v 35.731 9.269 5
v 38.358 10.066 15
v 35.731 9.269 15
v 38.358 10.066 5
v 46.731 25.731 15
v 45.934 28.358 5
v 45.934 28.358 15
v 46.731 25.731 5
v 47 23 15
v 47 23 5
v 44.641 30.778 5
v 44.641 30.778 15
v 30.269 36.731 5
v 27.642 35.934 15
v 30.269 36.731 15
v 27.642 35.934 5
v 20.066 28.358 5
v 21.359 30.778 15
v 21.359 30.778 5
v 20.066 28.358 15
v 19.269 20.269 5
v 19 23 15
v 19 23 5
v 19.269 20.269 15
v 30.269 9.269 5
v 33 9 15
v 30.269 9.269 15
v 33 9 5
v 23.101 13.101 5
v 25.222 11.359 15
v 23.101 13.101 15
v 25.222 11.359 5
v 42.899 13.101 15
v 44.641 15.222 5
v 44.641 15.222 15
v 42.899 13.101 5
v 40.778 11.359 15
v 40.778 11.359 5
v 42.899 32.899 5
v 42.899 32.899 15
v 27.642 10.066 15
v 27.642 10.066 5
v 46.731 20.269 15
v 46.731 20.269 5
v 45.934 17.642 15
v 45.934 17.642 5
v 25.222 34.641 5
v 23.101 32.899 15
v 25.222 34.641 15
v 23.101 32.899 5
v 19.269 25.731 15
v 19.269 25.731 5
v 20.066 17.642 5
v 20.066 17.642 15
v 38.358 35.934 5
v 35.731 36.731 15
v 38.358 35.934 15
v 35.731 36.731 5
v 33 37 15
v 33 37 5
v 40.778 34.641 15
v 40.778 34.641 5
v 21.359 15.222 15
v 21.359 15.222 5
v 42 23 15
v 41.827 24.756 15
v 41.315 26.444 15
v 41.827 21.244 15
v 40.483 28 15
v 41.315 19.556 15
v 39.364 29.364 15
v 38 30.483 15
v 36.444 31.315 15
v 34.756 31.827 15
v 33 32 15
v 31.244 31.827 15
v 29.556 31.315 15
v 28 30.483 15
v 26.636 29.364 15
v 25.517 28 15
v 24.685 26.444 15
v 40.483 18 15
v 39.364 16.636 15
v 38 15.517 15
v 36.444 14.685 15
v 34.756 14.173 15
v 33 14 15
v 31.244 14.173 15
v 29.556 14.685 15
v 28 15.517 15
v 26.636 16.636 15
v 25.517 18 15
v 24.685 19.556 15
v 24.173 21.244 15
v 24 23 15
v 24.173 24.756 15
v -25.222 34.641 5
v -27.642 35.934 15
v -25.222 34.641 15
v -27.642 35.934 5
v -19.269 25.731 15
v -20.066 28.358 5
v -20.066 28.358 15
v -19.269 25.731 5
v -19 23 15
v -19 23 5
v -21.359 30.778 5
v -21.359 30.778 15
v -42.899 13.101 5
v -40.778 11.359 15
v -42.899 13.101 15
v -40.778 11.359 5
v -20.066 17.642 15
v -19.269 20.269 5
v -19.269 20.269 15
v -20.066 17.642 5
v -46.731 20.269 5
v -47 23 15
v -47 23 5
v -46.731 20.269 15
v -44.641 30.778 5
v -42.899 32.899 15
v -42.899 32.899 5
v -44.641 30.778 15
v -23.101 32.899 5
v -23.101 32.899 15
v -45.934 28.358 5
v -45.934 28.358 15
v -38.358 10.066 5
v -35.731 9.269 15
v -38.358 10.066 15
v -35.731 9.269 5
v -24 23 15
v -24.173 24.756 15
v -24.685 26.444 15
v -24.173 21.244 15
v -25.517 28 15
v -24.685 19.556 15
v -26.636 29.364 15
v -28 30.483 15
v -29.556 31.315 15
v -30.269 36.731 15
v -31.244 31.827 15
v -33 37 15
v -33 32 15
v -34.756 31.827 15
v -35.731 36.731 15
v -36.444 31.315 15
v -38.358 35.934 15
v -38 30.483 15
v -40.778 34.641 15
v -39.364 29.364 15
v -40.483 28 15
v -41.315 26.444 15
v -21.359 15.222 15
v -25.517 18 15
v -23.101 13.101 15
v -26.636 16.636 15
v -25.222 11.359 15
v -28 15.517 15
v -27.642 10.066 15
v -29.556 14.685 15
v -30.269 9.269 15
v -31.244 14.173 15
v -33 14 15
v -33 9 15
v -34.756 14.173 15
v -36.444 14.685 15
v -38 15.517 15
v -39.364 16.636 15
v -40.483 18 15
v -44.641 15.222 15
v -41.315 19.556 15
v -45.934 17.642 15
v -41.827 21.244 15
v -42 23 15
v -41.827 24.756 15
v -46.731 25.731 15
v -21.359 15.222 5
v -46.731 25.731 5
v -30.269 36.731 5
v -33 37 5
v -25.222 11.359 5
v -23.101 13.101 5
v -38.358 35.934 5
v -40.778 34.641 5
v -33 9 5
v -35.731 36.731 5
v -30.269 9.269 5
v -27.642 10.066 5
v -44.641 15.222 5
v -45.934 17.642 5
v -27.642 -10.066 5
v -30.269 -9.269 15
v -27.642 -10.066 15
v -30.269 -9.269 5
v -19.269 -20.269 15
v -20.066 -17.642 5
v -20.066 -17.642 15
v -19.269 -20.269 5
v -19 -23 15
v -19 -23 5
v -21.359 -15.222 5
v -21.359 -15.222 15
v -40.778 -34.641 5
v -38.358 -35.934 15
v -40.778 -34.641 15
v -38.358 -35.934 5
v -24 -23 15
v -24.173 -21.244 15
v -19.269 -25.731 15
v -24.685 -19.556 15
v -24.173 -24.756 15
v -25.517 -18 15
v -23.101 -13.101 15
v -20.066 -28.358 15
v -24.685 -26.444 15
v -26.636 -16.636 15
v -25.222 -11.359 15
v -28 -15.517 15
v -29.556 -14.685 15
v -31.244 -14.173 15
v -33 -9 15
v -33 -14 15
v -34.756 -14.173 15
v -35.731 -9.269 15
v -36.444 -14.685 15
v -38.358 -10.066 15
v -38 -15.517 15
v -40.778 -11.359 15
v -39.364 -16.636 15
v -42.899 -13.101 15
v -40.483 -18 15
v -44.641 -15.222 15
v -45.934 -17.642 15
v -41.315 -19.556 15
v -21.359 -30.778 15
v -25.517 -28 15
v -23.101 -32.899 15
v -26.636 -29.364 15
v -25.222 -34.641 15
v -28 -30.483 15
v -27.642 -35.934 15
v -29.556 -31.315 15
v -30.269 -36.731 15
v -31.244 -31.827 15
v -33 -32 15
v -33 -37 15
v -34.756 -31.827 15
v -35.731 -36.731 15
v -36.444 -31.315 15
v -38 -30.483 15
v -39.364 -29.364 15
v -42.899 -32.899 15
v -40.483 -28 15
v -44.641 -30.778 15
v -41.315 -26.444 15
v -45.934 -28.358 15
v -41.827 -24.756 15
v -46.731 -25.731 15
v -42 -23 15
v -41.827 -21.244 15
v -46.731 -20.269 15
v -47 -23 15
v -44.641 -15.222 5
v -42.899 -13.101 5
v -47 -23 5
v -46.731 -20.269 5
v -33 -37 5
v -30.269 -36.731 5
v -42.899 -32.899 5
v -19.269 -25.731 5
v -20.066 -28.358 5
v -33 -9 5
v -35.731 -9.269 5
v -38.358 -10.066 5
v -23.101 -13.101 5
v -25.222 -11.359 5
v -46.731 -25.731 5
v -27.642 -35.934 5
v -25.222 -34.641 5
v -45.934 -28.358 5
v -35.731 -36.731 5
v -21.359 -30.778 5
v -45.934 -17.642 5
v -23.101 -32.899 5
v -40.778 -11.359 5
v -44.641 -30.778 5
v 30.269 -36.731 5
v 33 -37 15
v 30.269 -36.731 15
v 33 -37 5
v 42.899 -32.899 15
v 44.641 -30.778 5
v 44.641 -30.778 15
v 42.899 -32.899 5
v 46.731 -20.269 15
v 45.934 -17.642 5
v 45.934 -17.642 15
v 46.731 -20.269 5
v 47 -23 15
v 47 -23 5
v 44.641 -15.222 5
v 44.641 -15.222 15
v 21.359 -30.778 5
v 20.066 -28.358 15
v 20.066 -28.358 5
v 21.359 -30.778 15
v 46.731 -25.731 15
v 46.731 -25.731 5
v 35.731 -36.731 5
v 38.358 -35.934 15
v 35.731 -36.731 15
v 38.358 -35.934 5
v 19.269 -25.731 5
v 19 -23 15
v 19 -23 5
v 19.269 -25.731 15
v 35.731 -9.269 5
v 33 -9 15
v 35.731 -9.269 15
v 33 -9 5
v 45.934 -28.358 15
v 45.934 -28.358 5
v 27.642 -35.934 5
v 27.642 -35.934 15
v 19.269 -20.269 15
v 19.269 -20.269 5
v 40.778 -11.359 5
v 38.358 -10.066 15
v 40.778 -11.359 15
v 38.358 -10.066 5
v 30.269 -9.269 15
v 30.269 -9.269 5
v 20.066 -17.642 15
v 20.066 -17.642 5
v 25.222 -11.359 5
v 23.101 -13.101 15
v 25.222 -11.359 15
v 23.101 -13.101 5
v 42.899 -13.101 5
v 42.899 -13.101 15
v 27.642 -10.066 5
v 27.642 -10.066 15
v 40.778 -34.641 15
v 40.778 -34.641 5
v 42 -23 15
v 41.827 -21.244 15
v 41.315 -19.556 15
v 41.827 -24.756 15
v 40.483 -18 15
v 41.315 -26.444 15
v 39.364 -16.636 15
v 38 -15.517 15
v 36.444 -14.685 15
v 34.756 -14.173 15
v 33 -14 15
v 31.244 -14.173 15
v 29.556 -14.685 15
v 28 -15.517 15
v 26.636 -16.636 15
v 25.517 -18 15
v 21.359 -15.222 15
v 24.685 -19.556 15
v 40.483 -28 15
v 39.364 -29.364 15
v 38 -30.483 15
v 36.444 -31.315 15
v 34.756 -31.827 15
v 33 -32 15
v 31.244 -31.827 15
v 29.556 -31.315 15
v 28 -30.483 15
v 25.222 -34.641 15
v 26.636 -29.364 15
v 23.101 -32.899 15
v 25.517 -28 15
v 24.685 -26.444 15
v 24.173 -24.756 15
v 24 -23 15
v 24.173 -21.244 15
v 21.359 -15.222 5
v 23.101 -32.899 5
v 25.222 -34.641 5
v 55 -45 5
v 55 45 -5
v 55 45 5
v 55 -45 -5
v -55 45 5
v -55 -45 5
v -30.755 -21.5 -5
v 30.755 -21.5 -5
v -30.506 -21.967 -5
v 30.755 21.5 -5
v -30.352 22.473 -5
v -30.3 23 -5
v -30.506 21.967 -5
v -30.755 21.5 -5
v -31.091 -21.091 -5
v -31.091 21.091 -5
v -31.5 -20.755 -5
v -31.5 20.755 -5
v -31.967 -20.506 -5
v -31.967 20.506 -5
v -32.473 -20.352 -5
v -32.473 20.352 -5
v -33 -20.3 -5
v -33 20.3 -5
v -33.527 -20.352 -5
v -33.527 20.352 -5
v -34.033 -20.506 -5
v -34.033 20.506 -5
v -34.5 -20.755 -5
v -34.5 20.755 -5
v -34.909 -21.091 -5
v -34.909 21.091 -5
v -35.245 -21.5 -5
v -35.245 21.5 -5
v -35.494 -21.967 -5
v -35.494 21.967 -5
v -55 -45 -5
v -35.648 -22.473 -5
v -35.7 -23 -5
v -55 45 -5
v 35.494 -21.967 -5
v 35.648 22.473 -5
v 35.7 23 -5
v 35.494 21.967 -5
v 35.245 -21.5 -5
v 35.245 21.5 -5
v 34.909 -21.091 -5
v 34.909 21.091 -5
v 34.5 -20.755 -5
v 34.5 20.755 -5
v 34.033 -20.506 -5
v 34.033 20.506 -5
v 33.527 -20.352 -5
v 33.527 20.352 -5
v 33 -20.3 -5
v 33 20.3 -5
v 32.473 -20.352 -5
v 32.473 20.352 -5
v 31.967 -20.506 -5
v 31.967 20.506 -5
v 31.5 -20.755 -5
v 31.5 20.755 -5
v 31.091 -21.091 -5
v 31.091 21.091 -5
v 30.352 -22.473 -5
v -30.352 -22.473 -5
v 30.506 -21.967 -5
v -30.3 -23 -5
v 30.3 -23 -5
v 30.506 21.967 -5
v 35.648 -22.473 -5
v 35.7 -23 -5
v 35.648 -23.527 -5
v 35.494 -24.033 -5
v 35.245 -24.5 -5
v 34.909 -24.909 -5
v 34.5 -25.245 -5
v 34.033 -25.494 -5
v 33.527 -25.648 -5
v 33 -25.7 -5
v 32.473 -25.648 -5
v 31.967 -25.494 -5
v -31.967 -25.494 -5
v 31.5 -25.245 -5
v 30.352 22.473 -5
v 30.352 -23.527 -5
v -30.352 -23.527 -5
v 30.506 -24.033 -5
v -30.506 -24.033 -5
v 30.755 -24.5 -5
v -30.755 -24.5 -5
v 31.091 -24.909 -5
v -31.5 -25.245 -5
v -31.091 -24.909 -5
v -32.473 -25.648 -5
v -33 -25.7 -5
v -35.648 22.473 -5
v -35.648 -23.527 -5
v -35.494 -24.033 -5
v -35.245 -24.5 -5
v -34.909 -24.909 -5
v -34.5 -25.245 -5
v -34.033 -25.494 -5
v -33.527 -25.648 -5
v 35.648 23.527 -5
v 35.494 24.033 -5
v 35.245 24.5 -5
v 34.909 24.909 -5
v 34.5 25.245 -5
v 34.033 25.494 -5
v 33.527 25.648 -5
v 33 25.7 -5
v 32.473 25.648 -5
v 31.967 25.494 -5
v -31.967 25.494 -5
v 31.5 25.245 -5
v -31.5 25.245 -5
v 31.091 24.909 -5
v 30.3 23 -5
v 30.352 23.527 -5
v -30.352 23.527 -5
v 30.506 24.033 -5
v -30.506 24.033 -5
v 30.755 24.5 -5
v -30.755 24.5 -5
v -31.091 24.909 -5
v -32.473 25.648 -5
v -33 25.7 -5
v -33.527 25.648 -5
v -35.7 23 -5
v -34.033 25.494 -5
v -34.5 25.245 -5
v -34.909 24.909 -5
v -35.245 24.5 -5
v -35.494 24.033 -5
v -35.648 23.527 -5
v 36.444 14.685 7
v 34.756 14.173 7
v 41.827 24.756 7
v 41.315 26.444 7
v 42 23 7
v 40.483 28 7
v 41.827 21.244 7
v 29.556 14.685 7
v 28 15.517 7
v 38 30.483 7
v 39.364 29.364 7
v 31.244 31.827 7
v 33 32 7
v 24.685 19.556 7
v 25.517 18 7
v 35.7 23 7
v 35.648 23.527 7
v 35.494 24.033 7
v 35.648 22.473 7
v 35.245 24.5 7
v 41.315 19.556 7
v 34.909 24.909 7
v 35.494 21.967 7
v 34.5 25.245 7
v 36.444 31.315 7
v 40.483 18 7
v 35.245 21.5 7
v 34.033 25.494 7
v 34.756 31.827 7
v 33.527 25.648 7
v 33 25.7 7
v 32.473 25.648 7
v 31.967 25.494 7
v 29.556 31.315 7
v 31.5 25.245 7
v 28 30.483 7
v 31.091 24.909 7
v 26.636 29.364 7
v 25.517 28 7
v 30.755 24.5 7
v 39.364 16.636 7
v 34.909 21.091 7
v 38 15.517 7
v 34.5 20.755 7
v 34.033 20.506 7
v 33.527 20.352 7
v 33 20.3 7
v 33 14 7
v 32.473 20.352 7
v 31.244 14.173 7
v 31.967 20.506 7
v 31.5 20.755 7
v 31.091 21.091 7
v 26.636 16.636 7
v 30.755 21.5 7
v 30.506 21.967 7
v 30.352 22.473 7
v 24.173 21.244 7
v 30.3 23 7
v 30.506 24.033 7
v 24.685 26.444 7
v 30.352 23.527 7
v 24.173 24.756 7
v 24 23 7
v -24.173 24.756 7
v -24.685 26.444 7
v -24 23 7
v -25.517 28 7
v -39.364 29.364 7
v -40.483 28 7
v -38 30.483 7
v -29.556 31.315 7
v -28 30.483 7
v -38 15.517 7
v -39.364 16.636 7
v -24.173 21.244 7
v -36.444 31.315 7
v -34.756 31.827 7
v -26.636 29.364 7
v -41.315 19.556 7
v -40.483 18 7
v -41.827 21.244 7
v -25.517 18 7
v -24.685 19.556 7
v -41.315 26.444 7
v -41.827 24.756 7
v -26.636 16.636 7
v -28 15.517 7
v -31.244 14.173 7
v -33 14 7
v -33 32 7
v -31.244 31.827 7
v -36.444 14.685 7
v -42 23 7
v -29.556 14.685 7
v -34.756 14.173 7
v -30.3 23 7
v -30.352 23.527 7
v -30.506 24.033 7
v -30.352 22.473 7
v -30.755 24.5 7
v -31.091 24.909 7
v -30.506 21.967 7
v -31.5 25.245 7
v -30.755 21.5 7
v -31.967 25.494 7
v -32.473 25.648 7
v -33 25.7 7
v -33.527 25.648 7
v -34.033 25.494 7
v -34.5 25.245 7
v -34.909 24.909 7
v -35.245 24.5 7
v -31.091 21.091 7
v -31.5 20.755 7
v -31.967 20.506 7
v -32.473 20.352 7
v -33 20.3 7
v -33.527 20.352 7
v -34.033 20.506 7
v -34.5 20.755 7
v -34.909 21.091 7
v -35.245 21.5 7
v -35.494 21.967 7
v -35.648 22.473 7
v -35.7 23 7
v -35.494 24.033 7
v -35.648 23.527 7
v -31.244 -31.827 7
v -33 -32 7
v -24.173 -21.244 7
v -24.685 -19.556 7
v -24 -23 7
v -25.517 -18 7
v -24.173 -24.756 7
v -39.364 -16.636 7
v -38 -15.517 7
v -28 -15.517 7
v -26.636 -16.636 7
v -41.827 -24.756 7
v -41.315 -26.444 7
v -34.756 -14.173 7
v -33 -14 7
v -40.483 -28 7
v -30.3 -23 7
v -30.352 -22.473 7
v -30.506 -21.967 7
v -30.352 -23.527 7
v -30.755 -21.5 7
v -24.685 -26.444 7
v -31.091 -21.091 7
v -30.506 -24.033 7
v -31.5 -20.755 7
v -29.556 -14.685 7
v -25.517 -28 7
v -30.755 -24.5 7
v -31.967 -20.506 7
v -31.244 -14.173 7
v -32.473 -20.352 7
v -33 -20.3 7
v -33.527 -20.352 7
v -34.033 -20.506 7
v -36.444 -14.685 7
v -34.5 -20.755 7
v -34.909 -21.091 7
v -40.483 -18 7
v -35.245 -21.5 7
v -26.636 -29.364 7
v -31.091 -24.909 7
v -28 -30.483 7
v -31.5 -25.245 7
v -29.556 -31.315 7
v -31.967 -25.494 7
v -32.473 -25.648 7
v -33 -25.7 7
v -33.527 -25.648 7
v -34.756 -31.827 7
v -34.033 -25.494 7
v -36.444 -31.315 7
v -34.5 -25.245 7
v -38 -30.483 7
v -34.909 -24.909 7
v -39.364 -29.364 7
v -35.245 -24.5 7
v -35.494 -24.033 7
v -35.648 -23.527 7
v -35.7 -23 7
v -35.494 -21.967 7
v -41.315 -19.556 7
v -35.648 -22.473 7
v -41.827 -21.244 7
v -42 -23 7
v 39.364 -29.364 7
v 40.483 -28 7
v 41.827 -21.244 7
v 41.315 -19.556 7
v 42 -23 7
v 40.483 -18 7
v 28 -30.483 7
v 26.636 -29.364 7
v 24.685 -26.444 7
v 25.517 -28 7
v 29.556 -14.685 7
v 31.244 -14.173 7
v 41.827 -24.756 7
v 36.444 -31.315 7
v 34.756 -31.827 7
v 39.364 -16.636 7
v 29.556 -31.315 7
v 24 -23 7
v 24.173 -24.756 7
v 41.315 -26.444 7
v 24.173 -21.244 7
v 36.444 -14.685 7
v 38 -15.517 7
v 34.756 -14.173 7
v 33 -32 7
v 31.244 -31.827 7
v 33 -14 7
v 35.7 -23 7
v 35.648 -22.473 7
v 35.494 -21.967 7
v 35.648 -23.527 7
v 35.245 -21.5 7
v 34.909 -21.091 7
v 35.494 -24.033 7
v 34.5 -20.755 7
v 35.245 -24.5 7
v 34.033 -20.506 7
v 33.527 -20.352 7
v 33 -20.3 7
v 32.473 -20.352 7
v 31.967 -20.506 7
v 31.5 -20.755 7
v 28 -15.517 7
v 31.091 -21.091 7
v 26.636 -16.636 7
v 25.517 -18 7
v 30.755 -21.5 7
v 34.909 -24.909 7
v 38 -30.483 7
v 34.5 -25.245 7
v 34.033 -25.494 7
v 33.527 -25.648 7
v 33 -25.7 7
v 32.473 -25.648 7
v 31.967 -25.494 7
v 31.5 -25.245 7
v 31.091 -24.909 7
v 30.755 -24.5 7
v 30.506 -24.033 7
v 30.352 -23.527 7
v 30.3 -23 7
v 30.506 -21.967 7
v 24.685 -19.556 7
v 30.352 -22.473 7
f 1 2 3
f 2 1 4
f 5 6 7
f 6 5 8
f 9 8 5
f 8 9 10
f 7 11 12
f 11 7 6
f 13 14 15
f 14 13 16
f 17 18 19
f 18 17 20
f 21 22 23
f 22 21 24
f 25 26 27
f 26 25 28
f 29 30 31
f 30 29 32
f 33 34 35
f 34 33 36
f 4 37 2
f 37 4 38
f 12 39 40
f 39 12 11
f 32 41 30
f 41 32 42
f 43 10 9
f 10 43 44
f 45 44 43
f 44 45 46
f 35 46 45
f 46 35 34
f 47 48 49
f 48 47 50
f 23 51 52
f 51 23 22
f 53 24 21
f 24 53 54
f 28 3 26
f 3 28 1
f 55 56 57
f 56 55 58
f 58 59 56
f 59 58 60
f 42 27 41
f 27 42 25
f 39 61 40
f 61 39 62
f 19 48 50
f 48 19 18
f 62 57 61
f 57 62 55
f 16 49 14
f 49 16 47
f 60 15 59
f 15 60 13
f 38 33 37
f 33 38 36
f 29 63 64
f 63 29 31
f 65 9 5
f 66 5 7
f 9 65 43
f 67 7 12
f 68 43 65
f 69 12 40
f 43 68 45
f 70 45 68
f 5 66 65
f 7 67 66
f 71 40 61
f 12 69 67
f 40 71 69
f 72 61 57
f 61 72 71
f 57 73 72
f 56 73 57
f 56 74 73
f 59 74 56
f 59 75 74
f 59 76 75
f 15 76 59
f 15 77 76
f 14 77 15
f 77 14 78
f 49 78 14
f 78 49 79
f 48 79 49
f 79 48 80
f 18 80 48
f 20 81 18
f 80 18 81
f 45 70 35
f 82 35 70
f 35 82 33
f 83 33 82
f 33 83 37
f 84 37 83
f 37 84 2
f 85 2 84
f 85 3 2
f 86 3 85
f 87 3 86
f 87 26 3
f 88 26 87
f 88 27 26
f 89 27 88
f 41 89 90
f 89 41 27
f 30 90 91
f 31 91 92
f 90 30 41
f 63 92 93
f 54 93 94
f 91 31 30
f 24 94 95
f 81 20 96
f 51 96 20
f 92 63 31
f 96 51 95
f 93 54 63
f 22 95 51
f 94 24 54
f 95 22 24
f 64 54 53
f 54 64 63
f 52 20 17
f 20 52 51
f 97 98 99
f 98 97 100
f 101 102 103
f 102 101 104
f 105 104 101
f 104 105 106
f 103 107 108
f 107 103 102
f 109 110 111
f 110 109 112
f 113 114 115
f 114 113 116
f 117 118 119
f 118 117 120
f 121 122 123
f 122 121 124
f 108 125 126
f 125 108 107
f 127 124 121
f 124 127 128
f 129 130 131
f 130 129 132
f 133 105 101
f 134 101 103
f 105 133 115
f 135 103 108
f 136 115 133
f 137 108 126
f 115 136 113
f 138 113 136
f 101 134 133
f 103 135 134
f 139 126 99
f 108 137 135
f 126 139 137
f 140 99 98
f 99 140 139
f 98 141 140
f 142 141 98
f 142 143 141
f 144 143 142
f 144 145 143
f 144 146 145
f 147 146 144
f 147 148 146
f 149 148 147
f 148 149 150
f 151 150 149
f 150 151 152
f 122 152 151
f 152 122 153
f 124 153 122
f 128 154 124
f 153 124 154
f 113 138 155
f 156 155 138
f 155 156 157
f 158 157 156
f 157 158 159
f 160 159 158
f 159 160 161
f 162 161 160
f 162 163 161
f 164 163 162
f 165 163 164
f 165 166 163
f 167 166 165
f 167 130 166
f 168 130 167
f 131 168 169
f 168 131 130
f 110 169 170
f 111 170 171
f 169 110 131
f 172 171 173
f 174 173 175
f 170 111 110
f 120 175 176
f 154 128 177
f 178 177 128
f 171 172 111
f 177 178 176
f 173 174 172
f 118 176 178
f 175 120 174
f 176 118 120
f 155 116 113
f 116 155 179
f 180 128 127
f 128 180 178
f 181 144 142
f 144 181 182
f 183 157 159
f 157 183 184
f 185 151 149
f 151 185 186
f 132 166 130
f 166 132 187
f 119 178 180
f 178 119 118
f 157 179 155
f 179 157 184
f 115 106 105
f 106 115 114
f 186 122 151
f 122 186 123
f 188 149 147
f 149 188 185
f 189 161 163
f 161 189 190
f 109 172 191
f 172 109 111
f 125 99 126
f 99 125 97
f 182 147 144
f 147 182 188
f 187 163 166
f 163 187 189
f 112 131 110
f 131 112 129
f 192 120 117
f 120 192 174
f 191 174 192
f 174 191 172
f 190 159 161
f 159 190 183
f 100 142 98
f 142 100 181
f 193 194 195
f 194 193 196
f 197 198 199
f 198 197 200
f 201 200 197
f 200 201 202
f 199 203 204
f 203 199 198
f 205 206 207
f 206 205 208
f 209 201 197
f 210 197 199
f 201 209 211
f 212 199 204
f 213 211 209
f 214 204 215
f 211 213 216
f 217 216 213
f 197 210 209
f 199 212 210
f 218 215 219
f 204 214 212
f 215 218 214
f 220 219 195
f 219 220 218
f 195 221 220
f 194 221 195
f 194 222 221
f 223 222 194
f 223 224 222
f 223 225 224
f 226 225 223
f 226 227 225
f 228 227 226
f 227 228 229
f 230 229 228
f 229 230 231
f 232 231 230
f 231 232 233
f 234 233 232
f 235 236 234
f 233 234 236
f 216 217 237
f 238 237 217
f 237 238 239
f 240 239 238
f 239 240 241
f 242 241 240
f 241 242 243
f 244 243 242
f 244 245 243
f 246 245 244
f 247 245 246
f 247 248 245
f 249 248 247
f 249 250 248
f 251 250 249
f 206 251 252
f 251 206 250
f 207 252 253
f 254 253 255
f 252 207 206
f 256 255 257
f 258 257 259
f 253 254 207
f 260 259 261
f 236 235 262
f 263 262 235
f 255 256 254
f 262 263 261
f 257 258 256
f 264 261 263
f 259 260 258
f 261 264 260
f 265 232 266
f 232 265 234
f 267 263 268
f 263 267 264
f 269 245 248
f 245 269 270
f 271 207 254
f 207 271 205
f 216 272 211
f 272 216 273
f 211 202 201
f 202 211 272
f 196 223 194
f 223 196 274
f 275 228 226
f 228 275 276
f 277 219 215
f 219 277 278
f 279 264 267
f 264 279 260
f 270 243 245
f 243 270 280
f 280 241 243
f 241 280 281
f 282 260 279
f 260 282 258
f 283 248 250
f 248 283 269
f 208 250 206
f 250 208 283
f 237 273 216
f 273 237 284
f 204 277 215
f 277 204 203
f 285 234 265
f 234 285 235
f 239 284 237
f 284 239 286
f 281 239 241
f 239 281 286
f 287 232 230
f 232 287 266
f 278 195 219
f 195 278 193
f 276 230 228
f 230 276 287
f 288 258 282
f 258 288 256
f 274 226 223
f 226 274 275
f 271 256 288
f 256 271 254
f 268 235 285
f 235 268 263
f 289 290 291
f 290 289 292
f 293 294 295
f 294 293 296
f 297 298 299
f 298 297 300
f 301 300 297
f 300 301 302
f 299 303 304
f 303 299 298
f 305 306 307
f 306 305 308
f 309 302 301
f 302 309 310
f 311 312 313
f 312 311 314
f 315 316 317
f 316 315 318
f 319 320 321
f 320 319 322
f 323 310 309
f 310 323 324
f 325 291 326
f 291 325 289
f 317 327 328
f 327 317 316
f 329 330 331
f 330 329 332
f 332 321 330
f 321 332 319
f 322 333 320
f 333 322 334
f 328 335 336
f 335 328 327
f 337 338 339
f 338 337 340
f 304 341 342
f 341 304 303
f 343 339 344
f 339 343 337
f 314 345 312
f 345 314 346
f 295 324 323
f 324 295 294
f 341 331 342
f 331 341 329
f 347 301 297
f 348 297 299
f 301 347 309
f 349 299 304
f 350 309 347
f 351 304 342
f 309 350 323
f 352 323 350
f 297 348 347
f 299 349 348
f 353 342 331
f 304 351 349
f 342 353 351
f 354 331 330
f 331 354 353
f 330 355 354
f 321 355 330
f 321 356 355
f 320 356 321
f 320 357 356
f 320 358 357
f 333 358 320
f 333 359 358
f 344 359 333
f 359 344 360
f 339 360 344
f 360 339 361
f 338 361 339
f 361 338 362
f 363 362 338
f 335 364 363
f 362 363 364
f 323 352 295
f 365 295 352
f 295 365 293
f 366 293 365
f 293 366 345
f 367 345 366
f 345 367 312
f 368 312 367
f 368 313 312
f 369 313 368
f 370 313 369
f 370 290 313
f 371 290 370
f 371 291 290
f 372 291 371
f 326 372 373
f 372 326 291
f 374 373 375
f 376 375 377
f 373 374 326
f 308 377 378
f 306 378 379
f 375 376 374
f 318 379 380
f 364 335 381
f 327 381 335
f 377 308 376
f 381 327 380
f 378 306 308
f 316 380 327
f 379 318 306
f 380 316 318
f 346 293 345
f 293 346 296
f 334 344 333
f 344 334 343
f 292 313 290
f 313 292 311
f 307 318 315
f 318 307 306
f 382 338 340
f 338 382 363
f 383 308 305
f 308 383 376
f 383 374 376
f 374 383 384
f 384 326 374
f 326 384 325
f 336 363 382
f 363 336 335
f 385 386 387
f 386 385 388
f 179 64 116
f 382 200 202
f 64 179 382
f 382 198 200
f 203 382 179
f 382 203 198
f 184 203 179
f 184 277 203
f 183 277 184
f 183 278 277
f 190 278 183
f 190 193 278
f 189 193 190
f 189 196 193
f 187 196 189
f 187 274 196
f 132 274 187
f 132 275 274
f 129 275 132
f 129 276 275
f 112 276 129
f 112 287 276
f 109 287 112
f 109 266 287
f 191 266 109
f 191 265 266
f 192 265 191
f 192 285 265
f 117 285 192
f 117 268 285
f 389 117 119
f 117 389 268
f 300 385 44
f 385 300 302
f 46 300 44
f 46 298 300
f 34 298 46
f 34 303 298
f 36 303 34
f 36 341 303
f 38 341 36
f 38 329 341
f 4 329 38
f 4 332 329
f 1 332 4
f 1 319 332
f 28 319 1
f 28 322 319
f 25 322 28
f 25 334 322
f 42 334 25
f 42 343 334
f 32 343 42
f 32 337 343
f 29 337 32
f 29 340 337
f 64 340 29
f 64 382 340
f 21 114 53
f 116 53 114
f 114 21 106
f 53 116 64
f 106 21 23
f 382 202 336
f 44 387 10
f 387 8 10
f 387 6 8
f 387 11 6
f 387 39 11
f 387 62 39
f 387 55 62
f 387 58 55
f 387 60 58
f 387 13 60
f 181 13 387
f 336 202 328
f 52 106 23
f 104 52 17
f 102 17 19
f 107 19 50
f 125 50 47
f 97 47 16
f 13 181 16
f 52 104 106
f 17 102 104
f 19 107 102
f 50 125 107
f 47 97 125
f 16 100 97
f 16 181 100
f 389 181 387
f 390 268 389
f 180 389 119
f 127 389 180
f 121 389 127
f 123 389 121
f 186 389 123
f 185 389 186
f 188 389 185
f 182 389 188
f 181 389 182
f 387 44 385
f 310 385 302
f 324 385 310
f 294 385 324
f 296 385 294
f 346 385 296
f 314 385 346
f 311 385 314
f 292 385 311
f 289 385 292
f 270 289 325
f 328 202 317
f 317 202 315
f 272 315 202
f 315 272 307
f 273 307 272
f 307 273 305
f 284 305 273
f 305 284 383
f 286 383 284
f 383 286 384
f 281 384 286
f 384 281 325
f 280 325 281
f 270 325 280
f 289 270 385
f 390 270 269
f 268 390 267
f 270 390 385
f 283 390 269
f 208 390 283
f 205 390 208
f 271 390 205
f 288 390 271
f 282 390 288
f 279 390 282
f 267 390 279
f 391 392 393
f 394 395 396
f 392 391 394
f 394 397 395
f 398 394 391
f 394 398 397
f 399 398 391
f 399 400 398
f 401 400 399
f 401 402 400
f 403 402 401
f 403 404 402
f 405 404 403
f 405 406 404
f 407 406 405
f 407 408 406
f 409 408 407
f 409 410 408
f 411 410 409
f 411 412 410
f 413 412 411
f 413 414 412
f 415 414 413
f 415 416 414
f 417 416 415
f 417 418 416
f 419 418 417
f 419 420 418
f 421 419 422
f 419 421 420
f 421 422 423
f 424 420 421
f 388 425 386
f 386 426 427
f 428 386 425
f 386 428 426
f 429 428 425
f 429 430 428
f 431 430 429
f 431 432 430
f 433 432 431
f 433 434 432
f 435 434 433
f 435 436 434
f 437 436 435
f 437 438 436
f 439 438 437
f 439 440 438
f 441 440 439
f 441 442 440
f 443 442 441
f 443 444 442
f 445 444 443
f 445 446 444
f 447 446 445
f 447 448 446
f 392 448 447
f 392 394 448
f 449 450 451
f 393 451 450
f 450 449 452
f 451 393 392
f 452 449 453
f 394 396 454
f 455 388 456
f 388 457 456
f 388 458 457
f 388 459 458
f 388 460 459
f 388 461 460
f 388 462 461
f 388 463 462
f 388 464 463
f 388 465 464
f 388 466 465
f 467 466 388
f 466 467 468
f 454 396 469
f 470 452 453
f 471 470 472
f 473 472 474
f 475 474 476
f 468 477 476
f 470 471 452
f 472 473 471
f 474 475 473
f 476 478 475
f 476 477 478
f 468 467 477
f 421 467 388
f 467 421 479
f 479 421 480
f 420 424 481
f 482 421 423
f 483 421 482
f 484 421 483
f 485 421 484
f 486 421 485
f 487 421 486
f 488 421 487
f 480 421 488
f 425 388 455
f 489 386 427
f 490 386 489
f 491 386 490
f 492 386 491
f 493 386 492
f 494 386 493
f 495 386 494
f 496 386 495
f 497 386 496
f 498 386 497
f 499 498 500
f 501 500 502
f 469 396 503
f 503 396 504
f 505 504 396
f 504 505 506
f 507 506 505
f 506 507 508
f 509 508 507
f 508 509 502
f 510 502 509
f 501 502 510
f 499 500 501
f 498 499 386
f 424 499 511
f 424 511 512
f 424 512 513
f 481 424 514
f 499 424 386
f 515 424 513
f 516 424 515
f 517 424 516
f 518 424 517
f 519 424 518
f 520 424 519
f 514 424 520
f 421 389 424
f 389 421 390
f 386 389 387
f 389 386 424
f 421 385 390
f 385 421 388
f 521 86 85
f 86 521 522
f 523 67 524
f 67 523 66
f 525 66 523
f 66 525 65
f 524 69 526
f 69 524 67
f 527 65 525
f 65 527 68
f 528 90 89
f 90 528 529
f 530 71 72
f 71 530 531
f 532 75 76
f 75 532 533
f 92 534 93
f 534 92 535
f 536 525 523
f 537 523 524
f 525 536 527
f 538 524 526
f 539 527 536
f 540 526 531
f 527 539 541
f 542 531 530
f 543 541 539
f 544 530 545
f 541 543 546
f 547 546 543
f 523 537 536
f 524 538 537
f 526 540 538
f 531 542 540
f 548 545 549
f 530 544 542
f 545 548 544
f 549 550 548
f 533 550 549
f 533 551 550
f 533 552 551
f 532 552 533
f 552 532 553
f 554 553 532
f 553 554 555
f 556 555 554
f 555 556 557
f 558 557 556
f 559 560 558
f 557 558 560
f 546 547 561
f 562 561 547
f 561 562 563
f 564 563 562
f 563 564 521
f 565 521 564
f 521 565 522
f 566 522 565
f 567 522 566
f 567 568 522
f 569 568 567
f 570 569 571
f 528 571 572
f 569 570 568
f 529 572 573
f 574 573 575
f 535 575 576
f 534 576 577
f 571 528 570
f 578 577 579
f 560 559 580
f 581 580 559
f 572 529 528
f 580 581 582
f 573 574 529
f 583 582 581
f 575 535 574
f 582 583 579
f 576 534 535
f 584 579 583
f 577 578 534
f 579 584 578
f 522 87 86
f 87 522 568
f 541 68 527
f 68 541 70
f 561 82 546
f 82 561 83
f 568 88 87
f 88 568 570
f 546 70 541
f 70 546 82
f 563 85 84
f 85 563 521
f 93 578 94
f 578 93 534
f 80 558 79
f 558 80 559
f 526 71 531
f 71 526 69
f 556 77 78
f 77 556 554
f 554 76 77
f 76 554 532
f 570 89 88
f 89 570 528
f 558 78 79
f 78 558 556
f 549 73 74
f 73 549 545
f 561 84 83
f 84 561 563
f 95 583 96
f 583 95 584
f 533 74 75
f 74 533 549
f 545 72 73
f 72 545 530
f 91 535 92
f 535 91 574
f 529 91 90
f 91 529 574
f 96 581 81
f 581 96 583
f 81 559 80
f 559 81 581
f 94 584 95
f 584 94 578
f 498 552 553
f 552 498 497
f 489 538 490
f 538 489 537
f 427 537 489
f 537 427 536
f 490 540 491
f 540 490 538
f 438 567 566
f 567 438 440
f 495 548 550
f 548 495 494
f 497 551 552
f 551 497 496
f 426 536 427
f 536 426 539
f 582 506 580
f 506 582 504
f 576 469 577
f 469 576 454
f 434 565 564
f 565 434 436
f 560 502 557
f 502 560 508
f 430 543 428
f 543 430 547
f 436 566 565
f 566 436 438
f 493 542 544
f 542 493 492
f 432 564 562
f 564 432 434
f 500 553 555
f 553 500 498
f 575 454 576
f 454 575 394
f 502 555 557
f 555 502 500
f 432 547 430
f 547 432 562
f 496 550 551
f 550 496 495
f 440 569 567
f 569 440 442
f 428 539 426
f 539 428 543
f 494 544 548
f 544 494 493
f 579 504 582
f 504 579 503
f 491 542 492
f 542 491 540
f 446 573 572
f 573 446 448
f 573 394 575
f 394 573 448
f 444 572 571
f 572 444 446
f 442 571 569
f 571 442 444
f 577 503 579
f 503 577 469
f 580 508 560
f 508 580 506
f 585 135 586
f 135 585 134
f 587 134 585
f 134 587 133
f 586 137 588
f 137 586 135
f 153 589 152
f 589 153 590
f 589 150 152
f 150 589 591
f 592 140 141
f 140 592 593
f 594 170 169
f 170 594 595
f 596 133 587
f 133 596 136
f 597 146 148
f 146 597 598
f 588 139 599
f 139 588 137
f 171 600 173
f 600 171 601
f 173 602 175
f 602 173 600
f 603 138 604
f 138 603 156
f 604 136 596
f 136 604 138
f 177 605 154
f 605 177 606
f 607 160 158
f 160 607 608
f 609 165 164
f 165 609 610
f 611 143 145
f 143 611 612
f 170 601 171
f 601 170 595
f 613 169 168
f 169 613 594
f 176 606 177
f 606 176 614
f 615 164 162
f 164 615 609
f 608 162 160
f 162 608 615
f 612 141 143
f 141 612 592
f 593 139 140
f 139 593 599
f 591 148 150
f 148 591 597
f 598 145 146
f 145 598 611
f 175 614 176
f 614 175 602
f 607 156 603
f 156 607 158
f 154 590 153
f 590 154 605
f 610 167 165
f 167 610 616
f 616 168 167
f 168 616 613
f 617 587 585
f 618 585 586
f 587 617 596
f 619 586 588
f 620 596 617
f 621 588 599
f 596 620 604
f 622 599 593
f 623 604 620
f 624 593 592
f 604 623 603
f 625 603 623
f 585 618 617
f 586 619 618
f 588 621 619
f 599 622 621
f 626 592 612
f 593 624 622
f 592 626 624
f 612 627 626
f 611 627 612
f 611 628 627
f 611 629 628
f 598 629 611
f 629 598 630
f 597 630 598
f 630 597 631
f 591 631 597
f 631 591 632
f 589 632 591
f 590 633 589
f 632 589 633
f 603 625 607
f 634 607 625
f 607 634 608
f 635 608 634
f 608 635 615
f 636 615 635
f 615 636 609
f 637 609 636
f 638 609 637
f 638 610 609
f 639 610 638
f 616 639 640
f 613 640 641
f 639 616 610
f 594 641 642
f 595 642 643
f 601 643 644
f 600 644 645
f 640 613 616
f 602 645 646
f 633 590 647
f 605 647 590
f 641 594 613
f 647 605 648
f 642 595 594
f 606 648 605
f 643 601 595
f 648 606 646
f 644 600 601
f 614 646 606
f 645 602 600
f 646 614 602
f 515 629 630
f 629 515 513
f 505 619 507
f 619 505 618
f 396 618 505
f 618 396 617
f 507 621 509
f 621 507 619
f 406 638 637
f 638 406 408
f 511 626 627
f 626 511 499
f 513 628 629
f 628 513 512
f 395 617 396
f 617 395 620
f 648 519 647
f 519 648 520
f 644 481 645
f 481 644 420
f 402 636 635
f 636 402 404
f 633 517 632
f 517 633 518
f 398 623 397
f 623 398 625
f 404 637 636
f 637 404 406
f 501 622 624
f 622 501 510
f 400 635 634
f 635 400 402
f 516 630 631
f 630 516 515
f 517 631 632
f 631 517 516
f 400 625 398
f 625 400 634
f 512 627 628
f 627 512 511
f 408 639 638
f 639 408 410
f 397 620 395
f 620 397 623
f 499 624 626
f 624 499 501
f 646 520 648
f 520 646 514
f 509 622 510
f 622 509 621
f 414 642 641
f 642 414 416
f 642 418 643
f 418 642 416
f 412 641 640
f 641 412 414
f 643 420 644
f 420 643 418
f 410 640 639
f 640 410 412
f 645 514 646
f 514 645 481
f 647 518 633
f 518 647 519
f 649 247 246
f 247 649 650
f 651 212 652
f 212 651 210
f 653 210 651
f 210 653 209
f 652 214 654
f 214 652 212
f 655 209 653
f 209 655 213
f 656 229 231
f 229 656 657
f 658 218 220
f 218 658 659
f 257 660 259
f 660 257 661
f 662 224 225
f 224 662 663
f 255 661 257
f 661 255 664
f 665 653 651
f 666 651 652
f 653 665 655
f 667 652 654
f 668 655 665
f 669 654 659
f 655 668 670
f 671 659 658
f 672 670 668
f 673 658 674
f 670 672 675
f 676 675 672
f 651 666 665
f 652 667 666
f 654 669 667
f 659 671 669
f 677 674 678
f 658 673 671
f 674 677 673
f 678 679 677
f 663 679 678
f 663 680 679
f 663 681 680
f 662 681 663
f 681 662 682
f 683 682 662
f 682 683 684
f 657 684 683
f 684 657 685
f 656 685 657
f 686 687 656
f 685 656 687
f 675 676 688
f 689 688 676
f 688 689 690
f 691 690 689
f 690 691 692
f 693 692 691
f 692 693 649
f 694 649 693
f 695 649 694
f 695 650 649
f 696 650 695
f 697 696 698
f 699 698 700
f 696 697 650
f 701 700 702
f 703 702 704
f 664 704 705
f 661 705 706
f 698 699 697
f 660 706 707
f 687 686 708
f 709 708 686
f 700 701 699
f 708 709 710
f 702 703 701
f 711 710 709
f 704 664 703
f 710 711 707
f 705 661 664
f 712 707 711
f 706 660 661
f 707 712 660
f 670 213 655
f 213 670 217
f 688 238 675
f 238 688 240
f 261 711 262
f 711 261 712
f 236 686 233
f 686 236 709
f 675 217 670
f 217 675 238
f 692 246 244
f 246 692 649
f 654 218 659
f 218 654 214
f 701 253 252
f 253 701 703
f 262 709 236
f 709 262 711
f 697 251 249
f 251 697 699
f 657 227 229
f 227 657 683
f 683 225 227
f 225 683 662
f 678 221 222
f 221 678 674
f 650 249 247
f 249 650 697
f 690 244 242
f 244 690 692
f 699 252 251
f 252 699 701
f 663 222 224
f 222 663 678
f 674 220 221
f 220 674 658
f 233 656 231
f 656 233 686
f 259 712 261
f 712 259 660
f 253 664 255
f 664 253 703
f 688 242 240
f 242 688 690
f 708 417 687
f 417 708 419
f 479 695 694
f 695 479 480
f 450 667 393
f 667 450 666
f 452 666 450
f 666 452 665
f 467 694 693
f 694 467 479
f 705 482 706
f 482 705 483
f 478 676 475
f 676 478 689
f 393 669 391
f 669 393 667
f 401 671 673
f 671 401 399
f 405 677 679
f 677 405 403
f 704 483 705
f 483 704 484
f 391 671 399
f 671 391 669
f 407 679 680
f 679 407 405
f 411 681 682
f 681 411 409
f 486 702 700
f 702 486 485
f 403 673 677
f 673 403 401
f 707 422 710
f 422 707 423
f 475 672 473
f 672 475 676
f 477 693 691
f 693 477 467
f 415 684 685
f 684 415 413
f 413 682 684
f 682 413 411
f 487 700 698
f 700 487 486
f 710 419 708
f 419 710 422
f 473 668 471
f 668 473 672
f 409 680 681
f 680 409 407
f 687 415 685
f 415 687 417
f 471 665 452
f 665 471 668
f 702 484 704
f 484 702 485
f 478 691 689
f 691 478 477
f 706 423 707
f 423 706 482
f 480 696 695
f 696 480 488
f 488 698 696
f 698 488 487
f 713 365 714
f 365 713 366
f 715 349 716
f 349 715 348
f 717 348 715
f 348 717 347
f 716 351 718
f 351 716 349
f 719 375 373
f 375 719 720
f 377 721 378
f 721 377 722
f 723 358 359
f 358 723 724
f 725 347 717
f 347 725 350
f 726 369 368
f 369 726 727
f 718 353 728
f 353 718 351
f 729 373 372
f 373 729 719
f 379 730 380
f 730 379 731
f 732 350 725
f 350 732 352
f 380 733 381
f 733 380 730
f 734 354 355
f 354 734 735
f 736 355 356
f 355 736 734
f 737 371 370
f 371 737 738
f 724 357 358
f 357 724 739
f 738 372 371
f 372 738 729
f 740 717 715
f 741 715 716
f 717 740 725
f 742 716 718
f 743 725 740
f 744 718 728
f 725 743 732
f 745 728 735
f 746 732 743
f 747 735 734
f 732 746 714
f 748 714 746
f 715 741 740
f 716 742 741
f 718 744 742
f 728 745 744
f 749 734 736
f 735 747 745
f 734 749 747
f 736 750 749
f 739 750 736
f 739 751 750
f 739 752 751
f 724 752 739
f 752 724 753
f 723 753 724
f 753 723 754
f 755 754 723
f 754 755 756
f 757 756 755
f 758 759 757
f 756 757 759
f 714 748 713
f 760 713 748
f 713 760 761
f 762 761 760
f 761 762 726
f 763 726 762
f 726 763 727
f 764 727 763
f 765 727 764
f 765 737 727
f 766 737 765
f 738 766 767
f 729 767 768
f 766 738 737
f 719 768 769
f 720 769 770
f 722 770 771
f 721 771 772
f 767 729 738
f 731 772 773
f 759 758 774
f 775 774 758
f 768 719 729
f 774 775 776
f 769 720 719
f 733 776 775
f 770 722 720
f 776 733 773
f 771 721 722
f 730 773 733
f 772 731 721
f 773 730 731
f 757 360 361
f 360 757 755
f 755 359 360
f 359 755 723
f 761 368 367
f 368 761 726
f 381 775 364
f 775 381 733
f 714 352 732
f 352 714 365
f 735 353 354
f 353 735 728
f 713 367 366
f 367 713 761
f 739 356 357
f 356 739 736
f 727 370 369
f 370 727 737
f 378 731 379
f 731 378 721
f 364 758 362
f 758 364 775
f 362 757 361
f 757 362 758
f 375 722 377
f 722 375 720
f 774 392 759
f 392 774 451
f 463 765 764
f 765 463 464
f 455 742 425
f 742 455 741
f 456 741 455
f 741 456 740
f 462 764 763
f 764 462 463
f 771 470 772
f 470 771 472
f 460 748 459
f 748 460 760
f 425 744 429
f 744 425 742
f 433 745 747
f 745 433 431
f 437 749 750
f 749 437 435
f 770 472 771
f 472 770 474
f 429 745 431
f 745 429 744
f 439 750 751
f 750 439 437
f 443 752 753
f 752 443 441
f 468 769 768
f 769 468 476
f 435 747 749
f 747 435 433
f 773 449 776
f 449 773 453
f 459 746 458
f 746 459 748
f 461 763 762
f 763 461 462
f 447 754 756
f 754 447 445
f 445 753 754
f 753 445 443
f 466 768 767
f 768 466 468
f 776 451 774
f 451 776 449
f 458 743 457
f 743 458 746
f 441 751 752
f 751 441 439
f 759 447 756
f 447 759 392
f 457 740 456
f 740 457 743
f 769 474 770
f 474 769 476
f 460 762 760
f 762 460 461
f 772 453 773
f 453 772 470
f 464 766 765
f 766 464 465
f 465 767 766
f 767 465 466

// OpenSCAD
$fn = 32;

// ----------------------------------------------------------------------
// Socket pad plate
// bosses with counterbored sockets for the screws
// ----------------------------------------------------------------------

// --- parameters (mm) ---
base_t = 10;            // base plate thickness
boss_h = 10;            // boss height above the base plate
boss_d = 28;            // boss diameter
socket_d = 18;          // socket diameter
socket_depth = 8;       // socket depth from the boss face
bolt_d = 5.4;           // screw clearance hole through the socket floor
plate = [110, 90, 10];  // overall size (x, y, z)
edge = 22;              // boss centre offset from the plate edge
pads = 4;               // boss count, one per corner

// --- derived feature positions (mm) ---
height = base_t + boss_h;        // = 20   overall height of the part
corner_x = plate[0] / 2 - edge;  // = 33   boss centre X
corner_y = plate[1] / 2 - edge;  // = 23   boss centre Y
feature_centers = [
  [corner_x, corner_y],
  [-corner_x, corner_y],
  [-corner_x, -corner_y],
  [corner_x, -corner_y]
];   // boss centres: sockets, holes and the pads themselves are placed from here

// base plate, bosses on feature_centers, socket + through hole in each
difference() {
  union() {
    cube(plate, center = true);
    for (centre = feature_centers)
      translate([centre[0], centre[1], plate[2] / 2 - 1])
        cylinder(d = boss_d, h = boss_h + 1);
  }
  for (centre = feature_centers) {
    translate([centre[0], centre[1], plate[2] / 2 + boss_h - socket_depth])
      cylinder(d = socket_d, h = socket_depth + 1);
    translate([centre[0], centre[1], -height])
      cylinder(d = bolt_d, h = 2 * height + 2);  // through the socket floor
  }
}
